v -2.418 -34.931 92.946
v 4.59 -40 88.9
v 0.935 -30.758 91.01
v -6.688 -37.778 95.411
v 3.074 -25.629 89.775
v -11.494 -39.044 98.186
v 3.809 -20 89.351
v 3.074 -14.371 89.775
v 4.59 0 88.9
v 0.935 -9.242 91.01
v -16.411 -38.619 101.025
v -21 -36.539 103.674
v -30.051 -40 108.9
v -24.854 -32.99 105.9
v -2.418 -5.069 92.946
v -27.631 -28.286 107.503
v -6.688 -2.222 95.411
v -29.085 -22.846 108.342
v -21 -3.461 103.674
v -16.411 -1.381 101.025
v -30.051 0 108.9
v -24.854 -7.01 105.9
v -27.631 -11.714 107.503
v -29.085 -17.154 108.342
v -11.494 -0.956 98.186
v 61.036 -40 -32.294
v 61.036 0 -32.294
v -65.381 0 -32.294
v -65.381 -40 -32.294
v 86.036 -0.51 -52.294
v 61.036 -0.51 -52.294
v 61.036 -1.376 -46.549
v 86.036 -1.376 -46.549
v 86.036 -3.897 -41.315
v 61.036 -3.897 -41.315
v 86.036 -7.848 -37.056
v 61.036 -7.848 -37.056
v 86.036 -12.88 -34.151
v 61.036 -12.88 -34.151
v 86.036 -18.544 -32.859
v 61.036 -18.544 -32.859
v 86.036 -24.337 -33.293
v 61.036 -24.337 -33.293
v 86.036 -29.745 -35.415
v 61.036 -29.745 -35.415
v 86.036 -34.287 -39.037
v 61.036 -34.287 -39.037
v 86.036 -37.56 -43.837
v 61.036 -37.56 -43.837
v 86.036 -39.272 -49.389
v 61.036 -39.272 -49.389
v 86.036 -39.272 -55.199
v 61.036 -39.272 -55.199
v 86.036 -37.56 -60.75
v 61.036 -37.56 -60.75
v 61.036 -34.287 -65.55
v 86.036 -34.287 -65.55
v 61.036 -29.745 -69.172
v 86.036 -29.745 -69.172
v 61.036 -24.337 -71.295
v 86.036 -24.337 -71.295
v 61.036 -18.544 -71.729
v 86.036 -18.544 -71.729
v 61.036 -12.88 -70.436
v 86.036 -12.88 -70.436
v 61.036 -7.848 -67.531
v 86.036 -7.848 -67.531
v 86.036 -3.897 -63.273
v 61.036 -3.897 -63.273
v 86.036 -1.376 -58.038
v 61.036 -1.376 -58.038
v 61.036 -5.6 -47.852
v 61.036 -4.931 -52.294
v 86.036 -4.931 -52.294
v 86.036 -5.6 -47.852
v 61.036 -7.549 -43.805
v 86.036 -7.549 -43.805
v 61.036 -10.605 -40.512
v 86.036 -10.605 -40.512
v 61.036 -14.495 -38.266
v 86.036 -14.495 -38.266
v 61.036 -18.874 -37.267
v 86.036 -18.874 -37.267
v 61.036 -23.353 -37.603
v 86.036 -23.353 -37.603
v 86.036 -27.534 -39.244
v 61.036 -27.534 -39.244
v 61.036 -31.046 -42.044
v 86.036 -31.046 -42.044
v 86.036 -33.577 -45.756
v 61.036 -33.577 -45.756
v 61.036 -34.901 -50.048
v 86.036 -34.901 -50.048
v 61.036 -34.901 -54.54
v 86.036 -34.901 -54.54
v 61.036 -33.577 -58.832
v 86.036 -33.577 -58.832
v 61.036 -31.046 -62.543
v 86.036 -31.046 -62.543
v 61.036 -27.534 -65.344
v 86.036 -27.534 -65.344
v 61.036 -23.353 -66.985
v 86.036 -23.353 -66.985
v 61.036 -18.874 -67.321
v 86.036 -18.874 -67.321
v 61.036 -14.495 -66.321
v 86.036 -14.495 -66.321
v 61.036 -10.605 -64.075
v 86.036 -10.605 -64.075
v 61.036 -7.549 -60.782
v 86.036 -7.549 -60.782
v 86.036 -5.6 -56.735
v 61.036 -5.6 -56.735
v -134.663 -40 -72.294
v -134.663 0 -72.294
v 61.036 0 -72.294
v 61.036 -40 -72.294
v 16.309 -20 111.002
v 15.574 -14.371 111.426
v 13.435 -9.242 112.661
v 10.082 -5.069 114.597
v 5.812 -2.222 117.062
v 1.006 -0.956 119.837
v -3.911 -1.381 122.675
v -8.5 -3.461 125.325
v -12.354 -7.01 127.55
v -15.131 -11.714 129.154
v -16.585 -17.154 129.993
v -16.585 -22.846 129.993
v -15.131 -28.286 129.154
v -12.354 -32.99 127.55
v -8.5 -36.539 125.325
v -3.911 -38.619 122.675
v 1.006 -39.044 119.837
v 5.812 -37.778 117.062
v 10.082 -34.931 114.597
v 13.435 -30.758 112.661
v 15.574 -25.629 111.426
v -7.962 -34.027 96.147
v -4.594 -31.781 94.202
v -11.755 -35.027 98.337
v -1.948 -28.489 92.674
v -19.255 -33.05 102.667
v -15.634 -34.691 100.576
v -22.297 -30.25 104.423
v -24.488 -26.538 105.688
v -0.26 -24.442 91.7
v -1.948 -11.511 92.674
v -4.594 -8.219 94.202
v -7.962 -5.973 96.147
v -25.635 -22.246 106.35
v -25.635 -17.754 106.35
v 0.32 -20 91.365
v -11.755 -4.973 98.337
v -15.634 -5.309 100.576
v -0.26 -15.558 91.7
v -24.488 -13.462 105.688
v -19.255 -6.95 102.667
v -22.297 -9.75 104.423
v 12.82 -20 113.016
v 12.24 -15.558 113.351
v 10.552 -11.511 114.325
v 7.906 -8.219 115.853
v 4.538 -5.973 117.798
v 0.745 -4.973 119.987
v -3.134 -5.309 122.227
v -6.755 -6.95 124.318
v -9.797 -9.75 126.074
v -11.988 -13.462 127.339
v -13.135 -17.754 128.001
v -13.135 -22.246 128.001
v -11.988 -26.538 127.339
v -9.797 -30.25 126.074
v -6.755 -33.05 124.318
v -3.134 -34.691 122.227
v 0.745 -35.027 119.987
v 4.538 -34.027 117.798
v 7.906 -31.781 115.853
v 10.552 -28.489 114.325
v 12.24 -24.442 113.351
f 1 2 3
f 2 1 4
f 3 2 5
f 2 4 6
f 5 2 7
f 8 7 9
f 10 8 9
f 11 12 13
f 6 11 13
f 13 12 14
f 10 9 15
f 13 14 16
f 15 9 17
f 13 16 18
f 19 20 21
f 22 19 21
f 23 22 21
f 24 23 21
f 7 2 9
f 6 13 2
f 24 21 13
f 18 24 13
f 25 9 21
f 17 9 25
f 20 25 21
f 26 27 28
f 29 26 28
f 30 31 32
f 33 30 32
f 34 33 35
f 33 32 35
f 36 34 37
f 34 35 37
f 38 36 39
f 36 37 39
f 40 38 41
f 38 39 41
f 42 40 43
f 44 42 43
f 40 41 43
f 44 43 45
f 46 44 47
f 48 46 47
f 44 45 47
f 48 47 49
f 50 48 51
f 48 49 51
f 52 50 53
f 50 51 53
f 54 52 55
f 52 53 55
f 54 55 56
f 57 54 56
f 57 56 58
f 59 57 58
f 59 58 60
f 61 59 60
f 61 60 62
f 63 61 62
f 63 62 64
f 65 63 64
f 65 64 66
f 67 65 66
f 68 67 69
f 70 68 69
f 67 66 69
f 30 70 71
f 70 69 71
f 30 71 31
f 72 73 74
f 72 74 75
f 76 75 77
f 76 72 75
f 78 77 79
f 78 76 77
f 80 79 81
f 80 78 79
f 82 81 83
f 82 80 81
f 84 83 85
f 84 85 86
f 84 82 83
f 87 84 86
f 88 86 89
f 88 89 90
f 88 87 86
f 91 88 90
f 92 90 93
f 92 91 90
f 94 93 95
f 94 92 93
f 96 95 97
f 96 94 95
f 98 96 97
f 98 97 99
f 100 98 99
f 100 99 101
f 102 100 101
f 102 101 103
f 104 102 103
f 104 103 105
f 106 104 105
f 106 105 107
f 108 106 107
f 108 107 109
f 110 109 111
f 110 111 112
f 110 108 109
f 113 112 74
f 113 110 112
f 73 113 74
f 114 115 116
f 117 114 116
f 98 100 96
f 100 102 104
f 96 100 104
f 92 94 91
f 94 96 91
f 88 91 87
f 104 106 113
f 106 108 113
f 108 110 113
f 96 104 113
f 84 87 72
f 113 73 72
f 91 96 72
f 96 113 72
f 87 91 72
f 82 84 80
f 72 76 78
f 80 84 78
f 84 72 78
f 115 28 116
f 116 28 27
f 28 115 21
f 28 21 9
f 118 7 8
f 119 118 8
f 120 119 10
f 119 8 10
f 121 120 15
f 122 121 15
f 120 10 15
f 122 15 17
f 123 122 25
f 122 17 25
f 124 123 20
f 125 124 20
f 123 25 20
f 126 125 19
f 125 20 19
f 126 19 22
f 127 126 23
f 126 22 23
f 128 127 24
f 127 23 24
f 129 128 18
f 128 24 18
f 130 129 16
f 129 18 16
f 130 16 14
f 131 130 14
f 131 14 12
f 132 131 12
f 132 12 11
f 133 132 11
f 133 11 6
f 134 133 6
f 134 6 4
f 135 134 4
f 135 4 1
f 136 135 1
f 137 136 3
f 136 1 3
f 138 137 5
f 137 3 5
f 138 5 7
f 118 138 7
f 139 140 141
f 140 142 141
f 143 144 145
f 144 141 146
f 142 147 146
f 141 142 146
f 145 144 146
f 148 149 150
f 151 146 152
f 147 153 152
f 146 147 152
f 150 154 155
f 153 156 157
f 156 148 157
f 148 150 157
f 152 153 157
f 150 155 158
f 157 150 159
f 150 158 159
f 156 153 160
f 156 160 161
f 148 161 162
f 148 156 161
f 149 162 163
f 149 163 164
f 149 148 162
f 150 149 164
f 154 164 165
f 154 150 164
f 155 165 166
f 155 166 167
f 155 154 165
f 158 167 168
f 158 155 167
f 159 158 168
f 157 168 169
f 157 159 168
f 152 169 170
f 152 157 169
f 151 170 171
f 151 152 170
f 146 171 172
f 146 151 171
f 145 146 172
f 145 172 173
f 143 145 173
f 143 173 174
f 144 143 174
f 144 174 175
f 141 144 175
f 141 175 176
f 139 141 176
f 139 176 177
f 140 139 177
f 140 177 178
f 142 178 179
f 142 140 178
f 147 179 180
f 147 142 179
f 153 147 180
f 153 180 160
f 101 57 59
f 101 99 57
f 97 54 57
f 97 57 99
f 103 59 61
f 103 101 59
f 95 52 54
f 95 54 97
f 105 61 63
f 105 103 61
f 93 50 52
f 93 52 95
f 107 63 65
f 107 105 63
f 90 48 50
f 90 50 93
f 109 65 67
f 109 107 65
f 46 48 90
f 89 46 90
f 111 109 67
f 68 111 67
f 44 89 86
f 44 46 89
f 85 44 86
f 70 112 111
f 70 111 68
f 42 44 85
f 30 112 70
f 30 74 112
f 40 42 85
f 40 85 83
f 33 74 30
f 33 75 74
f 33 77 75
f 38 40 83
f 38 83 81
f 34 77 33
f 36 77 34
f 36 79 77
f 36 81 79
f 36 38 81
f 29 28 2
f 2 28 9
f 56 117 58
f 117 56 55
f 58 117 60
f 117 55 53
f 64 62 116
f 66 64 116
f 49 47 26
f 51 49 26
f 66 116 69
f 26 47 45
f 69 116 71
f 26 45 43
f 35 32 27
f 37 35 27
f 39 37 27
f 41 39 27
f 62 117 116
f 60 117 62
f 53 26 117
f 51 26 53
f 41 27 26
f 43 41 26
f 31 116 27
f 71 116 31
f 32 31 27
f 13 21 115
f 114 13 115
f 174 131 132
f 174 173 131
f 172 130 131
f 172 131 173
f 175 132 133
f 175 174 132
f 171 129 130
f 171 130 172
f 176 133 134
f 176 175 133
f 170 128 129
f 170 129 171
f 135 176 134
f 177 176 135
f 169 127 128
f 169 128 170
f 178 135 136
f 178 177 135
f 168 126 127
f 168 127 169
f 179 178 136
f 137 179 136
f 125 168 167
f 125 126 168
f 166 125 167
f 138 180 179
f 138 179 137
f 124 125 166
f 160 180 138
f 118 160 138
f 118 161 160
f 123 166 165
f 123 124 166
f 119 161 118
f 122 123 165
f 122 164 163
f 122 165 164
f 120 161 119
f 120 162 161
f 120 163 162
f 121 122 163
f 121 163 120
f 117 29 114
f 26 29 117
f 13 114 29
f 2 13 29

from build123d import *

# Parameters (mm, degrees)
F1_DEPTH = 40
F2_R     = 19.0977324209
F2_R_2   = 15.0689951662
F3_DEPTH = 25
F4_R     = 19.4897068619
F4_R_2   = 15.068995
F5_DEPTH = 25


with BuildPart() as f1:
    # F0 (on Front) → F1 (new body)
    with BuildSketch(Plane.XZ):
        Polygon((61.0357465344, -32.2937653869), (-65.3808493135, -32.2937653869), (4.5902623163, 88.899755018), (-30.0507538351, 108.899755018), (-134.6628816163, -72.2937653869), (61.0357465344, -72.2937653869), align=None)
    extrude(amount=F1_DEPTH)

    # F2 (on face) → F3 (join)
    with BuildSketch(Plane(origin=(39.642288697, 0, 68.6624581515), x_dir=(0.8660254038, 0, -0.5), z_dir=(0.5, 0, 0.8660254038))):
        with Locations((-60.4745937331, -20)):
            Circle(F2_R)
        with Locations((-60.4745937331, -20)):
            Circle(F2_R_2, mode=Mode.SUBTRACT)
    extrude(amount=F3_DEPTH)

    # F4 (on face) → F5 (join)
    with BuildSketch(Plane.YZ.offset(61.0357465344)):
        with Locations((-20, -52.2937653869)):
            Circle(F4_R)
        with Locations((-20, -52.2937653869)):
            Circle(F4_R_2, mode=Mode.SUBTRACT)
    extrude(amount=F5_DEPTH)


solid = f1.part
